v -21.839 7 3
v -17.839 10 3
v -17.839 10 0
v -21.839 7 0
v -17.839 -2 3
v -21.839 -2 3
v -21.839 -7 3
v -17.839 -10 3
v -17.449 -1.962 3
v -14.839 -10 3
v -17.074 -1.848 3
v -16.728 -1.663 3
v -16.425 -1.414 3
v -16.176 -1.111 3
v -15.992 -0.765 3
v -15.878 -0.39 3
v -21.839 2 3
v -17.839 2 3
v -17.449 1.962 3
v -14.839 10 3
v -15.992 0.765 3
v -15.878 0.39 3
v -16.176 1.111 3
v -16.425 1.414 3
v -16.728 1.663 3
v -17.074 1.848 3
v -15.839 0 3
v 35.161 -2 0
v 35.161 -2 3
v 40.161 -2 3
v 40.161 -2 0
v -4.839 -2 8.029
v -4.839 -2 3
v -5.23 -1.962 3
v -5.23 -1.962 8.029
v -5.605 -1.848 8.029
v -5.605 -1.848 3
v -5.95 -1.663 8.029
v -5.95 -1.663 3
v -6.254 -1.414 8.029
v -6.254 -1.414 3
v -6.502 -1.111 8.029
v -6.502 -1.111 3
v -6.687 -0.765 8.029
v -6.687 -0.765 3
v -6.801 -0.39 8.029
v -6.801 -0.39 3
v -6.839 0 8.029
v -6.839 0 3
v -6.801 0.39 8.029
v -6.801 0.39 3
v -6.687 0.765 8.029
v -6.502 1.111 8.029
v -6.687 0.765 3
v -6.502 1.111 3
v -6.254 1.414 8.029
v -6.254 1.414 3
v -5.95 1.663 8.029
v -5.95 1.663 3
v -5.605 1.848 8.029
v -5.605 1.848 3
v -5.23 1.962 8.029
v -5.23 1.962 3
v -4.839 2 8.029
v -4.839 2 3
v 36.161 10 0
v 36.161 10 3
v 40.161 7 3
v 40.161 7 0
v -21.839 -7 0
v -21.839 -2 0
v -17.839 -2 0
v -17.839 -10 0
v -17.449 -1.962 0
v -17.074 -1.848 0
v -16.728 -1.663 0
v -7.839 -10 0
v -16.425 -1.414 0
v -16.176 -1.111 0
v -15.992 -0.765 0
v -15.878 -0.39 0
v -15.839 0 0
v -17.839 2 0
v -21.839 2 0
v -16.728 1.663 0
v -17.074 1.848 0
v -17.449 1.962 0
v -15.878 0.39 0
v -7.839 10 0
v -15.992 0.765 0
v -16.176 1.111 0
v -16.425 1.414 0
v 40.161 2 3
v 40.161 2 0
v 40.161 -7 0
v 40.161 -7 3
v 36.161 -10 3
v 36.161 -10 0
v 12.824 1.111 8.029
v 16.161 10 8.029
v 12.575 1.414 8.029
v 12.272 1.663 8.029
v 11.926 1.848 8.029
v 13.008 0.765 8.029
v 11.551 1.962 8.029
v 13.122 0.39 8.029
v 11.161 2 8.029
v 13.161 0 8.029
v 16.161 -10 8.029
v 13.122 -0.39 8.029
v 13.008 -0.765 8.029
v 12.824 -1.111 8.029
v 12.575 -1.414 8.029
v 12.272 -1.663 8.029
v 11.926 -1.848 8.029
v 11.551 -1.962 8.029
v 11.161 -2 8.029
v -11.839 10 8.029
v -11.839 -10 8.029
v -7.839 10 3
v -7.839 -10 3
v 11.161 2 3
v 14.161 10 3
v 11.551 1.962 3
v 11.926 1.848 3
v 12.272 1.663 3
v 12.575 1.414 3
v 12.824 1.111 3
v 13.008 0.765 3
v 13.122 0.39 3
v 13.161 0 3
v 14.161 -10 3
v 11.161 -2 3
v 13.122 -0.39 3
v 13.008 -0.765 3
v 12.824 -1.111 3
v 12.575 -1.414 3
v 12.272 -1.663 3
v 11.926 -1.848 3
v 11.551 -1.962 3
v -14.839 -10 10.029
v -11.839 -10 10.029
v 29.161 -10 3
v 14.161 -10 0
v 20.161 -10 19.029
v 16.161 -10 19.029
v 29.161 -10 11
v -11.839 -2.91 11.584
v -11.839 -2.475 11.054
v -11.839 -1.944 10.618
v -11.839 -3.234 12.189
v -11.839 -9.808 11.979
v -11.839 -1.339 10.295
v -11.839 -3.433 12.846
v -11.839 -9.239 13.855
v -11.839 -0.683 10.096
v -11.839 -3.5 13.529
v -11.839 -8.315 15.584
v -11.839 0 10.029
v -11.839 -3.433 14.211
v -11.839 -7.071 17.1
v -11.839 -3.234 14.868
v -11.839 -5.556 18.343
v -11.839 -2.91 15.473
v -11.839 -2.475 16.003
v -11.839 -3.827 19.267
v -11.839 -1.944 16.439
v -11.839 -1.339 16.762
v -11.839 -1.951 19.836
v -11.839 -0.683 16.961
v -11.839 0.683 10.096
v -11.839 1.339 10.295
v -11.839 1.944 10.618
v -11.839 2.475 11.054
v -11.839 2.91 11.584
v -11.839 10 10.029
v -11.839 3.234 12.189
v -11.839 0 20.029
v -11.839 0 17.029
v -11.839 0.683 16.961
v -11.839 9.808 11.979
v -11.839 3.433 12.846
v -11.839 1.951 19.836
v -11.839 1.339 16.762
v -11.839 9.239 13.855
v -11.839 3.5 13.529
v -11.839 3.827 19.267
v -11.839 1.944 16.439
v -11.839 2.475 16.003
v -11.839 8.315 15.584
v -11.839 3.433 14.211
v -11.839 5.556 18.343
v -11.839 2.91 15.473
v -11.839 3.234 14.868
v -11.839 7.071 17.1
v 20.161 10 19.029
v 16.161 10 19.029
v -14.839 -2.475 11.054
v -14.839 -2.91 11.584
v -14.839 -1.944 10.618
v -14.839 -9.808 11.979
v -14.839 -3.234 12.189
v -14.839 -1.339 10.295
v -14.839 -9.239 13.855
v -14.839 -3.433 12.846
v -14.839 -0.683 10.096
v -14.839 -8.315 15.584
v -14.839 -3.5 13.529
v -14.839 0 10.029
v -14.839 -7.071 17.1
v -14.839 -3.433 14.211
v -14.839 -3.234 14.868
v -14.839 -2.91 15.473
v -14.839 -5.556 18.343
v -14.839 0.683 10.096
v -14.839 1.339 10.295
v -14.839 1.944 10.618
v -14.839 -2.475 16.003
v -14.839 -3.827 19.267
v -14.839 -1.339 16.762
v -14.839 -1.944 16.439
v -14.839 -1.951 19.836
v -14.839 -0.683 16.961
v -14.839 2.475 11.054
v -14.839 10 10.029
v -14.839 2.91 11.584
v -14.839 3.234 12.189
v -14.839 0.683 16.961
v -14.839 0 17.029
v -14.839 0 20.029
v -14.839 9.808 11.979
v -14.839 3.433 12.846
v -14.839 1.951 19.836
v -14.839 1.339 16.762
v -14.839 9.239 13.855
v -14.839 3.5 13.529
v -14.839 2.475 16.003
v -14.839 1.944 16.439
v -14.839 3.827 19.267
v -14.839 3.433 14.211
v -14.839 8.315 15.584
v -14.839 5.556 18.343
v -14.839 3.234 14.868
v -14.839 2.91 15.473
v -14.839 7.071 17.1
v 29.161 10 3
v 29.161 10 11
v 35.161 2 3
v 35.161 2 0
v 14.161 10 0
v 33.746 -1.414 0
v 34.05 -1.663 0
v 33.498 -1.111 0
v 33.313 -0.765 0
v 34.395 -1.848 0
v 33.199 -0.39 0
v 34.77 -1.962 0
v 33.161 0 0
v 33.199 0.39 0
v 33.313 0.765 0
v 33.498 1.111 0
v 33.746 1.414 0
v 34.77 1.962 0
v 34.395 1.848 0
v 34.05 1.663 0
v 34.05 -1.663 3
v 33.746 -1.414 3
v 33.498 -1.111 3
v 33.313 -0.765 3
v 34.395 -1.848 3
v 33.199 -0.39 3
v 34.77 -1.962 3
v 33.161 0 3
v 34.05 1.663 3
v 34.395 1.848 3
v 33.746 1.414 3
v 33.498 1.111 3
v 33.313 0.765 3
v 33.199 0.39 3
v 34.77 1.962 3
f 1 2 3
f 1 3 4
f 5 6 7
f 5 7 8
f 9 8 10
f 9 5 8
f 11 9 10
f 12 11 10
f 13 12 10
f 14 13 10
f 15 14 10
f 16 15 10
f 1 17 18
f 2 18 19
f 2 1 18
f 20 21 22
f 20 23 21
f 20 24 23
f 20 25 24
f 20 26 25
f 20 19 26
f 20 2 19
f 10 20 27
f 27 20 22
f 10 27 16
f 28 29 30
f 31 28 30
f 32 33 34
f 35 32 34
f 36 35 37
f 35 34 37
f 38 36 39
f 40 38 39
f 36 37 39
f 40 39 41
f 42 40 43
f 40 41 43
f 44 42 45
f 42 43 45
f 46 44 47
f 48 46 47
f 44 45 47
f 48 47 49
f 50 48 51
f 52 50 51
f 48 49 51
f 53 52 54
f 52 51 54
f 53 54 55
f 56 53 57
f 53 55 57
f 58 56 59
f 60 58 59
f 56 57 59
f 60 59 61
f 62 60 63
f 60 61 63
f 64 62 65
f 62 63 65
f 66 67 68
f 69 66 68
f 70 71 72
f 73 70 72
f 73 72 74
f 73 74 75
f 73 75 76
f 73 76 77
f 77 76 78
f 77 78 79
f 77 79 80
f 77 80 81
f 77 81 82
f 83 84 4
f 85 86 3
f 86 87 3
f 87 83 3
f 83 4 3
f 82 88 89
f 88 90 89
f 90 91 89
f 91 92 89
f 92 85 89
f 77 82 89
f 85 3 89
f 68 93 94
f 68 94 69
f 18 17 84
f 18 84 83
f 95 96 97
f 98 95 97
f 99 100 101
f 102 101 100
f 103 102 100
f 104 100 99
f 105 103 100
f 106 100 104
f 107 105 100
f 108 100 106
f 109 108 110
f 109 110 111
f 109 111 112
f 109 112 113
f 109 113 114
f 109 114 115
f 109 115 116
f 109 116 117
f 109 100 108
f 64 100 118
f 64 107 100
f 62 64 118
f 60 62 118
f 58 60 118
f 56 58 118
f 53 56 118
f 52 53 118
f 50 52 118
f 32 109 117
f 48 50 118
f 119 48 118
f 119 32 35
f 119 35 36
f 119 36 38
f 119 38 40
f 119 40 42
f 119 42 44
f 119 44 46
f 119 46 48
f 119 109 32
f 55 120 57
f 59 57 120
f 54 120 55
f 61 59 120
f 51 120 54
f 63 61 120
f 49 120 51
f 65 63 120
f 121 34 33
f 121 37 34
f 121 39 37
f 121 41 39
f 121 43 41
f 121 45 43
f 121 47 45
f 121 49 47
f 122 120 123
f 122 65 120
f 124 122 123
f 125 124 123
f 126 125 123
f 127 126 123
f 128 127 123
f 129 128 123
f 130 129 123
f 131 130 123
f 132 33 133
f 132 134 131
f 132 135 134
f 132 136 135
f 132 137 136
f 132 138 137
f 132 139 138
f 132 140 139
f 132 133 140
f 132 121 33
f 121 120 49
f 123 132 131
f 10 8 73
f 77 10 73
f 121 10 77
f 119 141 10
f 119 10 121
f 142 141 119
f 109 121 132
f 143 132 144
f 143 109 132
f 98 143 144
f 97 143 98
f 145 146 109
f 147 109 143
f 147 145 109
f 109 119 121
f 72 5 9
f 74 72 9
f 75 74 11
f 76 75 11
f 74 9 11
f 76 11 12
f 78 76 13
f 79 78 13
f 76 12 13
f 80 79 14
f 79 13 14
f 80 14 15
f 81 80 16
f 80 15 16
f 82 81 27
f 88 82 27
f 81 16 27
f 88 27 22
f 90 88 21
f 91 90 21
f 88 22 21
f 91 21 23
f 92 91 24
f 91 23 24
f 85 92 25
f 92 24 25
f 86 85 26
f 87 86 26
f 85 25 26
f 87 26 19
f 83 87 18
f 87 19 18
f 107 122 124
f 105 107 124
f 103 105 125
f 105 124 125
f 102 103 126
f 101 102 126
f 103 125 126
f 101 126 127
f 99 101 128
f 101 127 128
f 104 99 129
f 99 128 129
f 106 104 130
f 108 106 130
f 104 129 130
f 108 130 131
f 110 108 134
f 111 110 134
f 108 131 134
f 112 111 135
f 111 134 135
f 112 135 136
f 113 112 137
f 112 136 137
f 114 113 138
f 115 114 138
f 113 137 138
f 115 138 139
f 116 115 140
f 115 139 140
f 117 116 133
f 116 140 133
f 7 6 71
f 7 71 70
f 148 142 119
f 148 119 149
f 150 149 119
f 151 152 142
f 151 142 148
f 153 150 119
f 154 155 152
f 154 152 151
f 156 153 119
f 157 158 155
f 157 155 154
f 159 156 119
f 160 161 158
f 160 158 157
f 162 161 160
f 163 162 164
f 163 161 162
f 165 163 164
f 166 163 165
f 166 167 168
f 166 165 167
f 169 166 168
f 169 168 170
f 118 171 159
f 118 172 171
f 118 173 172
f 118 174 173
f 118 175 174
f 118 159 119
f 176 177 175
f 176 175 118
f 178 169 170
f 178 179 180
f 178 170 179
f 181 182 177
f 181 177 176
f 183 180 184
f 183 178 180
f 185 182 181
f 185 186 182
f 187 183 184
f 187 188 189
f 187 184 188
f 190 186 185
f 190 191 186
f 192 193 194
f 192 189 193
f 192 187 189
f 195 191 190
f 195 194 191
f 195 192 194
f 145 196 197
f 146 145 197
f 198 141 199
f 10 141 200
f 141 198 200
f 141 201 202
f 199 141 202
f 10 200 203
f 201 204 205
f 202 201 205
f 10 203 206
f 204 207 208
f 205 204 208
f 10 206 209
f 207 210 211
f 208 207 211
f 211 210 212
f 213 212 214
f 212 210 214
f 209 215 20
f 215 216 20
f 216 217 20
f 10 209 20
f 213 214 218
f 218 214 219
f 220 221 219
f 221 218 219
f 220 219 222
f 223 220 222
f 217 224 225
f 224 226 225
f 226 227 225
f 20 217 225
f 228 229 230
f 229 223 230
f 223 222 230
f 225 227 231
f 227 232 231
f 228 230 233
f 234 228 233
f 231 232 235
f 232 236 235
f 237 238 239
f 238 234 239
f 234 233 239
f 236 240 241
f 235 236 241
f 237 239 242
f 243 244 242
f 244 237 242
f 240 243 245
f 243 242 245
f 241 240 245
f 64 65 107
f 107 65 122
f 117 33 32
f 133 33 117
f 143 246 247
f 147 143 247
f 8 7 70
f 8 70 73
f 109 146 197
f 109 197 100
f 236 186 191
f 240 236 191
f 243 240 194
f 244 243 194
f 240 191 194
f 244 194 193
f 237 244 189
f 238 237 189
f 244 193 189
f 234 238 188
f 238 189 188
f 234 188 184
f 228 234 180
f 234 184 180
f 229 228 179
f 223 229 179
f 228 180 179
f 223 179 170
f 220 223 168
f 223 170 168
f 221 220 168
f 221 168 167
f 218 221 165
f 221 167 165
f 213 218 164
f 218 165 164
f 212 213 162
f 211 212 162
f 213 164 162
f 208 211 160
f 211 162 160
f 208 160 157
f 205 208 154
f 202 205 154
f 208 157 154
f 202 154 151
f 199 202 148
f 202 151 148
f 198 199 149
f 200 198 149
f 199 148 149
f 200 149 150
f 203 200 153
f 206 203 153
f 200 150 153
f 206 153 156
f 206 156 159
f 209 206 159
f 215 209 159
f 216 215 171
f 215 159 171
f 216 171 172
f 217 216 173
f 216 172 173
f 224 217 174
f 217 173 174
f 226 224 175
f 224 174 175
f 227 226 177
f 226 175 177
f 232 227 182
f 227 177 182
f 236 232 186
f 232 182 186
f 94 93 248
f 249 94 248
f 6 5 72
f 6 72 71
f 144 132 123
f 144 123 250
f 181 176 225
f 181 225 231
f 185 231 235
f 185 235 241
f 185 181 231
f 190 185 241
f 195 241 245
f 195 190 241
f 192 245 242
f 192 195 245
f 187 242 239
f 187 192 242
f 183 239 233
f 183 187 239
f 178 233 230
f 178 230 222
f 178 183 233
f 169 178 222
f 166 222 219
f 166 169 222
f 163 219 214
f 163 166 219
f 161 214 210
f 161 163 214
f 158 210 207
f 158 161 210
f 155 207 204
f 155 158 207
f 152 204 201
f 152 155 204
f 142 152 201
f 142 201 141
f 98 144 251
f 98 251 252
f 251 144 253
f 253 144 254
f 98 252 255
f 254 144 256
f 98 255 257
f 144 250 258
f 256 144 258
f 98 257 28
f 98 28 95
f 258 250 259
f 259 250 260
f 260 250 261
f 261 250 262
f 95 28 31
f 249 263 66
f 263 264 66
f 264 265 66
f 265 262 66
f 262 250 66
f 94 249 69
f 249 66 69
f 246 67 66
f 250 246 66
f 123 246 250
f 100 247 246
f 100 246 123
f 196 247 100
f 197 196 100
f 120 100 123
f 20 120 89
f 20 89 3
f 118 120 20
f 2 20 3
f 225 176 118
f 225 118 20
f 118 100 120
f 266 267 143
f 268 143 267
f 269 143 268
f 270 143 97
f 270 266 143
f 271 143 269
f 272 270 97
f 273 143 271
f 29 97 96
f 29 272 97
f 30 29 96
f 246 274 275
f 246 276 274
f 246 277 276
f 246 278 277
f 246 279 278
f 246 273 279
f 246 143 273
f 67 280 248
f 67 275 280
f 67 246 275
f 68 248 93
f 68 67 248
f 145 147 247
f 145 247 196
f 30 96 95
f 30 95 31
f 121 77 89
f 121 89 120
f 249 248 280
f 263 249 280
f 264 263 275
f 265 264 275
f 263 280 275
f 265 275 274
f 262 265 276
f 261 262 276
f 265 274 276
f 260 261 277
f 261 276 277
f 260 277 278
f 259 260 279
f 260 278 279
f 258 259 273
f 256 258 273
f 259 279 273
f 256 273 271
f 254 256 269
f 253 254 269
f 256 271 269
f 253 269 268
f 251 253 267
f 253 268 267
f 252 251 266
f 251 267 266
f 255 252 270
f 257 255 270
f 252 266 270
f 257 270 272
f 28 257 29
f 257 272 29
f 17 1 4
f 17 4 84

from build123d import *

# Parameters (mm, degrees)
F1_DEPTH  = 10
F3_W      = 4
F3_H      = 4
F4_DEPTH  = 3
F5_DEPTH  = 3
F7_DEPTH  = 3
F8_DEPTH  = 3
F9_W      = 16
F9_H      = 4
F10_DEPTH = 6
F11_DEPTH = 3
F12_R     = 3.5
F13_DEPTH = 3


with BuildPart() as f1:
    # F0 (on Front) → F1 (new body, symmetric)
    with BuildSketch(Plane.XZ):
        Polygon((-17.8393546607, 3), (-17.8393546607, 0), (-7.8393546607, 0), (-7.8393546607, 3), (14.1606453393, 3), (14.1606453393, 0), (36.1606453393, 0), (36.1606453393, 3), (29.1606453393, 3), (29.1606453393, 11), (20.1606453393, 19.0285857916), (16.1606453393, 19.0285857916), (16.1606453393, 8.0285857916), (-11.8393546607, 8.0285857916), (-11.8393546607, 10.0285857916), (-14.8393546607, 10.0285857916), (-14.8393546607, 3), align=None)
    extrude(amount=F1_DEPTH, both=True)

    # F3 (on face) → F4 (join)
    with BuildSketch(Plane.XY.offset(3)):
        Polygon((40.1606453393, 7), (36.1606453393, 10), (36.1606453393, 2), (40.1606453393, 2), align=None)
        Polygon((40.1606453393, 10), (36.1606453393, 10), (40.1606453393, 7), align=None)
        with Locations((38.1606453393, 0)):
            Rectangle(F3_W, F3_H)
        with BuildLine():
            Line((36.1606453393, -2), (36.1606453393, 2))
            Line((36.1606453393, 2), (35.1606453393, 2))
            ThreePointArc((35.1606453393, 2), (33.1606453393, 0), (35.1606453393, -2))
            Line((35.1606453393, -2), (36.1606453393, -2))
        make_face()
        Polygon((40.1606453393, -2), (36.1606453393, -2), (36.1606453393, -10), (40.1606453393, -7), align=None)
        Polygon((40.1606453393, -7), (36.1606453393, -10), (40.1606453393, -10), align=None)
    extrude(amount=-F4_DEPTH)

    # F3 (on face) → F5 (cut)
    with BuildSketch(Plane.XY.offset(3)):
        with Locations((38.1606453393, 0)):
            Rectangle(F3_W, F3_H)
        with BuildLine():
            Line((36.1606453393, -2), (36.1606453393, 2))
            Line((36.1606453393, 2), (35.1606453393, 2))
            ThreePointArc((35.1606453393, 2), (33.1606453393, 0), (35.1606453393, -2))
            Line((35.1606453393, -2), (36.1606453393, -2))
        make_face()
        Polygon((40.1606453393, -7), (36.1606453393, -10), (40.1606453393, -10), align=None)
        Polygon((40.1606453393, 10), (36.1606453393, 10), (40.1606453393, 7), align=None)
    extrude(amount=-F5_DEPTH, mode=Mode.SUBTRACT)

    # F6 (on face) → F7 (join)
    with BuildSketch(Plane.XY.offset(3)):
        Polygon((-17.8393546607, 2), (-17.8393546607, 10), (-21.8393546607, 7), (-21.8393546607, 2), align=None)
        Polygon((-17.8393546607, -10), (-17.8393546607, -2), (-21.8393546607, -2), (-21.8393546607, -7), align=None)
    extrude(amount=-F7_DEPTH)

    # F6 (on face) → F8 (cut)
    with BuildSketch(Plane.XY.offset(3)):
        with BuildLine():
            ThreePointArc((-17.8393546607, -2), (-15.8393546607, 0), (-17.8393546607, 2))
            Line((-17.8393546607, 2), (-17.8393546607, -2))
        make_face()
    extrude(amount=-F8_DEPTH, mode=Mode.SUBTRACT)

    # F9 (on face) → F10 (cut)
    with BuildSketch(Plane(origin=(0, 0, 3), x_dir=(1, 0, 0), z_dir=(0, 0, -1))):
        with Locations((3.1606453393, 0)):
            Rectangle(F9_W, F9_H)
        with BuildLine():
            Line((-4.8393546607, -2), (-4.8393546607, 2))
            ThreePointArc((-4.8393546607, 2), (-6.8393546607, 0), (-4.8393546607, -2))
        make_face()
        with BuildLine():
            ThreePointArc((11.1606453393, -2), (13.1606453393, 0), (11.1606453393, 2))
            Line((11.1606453393, 2), (11.1606453393, -2))
        make_face()
    extrude(amount=-F10_DEPTH, mode=Mode.SUBTRACT)

    # F2 (on face) → F11 (join)
    with BuildSketch(Plane.YZ.offset(-11.8393546607)):
        with BuildLine():
            Line((-10, 10.0285857916), (10, 10.0285857916))
            ThreePointArc((10, 10.0285857916), (0, 20.0285857916), (-10, 10.0285857916))
        make_face()
    extrude(amount=-F11_DEPTH)

    # F12 (on face) → F13 (cut)
    with BuildSketch(Plane.YZ.offset(-11.8393546607)):
        with Locations((0, 13.5285857916)):
            Circle(F12_R)
    extrude(amount=-F13_DEPTH, mode=Mode.SUBTRACT)


solid = f1.part
